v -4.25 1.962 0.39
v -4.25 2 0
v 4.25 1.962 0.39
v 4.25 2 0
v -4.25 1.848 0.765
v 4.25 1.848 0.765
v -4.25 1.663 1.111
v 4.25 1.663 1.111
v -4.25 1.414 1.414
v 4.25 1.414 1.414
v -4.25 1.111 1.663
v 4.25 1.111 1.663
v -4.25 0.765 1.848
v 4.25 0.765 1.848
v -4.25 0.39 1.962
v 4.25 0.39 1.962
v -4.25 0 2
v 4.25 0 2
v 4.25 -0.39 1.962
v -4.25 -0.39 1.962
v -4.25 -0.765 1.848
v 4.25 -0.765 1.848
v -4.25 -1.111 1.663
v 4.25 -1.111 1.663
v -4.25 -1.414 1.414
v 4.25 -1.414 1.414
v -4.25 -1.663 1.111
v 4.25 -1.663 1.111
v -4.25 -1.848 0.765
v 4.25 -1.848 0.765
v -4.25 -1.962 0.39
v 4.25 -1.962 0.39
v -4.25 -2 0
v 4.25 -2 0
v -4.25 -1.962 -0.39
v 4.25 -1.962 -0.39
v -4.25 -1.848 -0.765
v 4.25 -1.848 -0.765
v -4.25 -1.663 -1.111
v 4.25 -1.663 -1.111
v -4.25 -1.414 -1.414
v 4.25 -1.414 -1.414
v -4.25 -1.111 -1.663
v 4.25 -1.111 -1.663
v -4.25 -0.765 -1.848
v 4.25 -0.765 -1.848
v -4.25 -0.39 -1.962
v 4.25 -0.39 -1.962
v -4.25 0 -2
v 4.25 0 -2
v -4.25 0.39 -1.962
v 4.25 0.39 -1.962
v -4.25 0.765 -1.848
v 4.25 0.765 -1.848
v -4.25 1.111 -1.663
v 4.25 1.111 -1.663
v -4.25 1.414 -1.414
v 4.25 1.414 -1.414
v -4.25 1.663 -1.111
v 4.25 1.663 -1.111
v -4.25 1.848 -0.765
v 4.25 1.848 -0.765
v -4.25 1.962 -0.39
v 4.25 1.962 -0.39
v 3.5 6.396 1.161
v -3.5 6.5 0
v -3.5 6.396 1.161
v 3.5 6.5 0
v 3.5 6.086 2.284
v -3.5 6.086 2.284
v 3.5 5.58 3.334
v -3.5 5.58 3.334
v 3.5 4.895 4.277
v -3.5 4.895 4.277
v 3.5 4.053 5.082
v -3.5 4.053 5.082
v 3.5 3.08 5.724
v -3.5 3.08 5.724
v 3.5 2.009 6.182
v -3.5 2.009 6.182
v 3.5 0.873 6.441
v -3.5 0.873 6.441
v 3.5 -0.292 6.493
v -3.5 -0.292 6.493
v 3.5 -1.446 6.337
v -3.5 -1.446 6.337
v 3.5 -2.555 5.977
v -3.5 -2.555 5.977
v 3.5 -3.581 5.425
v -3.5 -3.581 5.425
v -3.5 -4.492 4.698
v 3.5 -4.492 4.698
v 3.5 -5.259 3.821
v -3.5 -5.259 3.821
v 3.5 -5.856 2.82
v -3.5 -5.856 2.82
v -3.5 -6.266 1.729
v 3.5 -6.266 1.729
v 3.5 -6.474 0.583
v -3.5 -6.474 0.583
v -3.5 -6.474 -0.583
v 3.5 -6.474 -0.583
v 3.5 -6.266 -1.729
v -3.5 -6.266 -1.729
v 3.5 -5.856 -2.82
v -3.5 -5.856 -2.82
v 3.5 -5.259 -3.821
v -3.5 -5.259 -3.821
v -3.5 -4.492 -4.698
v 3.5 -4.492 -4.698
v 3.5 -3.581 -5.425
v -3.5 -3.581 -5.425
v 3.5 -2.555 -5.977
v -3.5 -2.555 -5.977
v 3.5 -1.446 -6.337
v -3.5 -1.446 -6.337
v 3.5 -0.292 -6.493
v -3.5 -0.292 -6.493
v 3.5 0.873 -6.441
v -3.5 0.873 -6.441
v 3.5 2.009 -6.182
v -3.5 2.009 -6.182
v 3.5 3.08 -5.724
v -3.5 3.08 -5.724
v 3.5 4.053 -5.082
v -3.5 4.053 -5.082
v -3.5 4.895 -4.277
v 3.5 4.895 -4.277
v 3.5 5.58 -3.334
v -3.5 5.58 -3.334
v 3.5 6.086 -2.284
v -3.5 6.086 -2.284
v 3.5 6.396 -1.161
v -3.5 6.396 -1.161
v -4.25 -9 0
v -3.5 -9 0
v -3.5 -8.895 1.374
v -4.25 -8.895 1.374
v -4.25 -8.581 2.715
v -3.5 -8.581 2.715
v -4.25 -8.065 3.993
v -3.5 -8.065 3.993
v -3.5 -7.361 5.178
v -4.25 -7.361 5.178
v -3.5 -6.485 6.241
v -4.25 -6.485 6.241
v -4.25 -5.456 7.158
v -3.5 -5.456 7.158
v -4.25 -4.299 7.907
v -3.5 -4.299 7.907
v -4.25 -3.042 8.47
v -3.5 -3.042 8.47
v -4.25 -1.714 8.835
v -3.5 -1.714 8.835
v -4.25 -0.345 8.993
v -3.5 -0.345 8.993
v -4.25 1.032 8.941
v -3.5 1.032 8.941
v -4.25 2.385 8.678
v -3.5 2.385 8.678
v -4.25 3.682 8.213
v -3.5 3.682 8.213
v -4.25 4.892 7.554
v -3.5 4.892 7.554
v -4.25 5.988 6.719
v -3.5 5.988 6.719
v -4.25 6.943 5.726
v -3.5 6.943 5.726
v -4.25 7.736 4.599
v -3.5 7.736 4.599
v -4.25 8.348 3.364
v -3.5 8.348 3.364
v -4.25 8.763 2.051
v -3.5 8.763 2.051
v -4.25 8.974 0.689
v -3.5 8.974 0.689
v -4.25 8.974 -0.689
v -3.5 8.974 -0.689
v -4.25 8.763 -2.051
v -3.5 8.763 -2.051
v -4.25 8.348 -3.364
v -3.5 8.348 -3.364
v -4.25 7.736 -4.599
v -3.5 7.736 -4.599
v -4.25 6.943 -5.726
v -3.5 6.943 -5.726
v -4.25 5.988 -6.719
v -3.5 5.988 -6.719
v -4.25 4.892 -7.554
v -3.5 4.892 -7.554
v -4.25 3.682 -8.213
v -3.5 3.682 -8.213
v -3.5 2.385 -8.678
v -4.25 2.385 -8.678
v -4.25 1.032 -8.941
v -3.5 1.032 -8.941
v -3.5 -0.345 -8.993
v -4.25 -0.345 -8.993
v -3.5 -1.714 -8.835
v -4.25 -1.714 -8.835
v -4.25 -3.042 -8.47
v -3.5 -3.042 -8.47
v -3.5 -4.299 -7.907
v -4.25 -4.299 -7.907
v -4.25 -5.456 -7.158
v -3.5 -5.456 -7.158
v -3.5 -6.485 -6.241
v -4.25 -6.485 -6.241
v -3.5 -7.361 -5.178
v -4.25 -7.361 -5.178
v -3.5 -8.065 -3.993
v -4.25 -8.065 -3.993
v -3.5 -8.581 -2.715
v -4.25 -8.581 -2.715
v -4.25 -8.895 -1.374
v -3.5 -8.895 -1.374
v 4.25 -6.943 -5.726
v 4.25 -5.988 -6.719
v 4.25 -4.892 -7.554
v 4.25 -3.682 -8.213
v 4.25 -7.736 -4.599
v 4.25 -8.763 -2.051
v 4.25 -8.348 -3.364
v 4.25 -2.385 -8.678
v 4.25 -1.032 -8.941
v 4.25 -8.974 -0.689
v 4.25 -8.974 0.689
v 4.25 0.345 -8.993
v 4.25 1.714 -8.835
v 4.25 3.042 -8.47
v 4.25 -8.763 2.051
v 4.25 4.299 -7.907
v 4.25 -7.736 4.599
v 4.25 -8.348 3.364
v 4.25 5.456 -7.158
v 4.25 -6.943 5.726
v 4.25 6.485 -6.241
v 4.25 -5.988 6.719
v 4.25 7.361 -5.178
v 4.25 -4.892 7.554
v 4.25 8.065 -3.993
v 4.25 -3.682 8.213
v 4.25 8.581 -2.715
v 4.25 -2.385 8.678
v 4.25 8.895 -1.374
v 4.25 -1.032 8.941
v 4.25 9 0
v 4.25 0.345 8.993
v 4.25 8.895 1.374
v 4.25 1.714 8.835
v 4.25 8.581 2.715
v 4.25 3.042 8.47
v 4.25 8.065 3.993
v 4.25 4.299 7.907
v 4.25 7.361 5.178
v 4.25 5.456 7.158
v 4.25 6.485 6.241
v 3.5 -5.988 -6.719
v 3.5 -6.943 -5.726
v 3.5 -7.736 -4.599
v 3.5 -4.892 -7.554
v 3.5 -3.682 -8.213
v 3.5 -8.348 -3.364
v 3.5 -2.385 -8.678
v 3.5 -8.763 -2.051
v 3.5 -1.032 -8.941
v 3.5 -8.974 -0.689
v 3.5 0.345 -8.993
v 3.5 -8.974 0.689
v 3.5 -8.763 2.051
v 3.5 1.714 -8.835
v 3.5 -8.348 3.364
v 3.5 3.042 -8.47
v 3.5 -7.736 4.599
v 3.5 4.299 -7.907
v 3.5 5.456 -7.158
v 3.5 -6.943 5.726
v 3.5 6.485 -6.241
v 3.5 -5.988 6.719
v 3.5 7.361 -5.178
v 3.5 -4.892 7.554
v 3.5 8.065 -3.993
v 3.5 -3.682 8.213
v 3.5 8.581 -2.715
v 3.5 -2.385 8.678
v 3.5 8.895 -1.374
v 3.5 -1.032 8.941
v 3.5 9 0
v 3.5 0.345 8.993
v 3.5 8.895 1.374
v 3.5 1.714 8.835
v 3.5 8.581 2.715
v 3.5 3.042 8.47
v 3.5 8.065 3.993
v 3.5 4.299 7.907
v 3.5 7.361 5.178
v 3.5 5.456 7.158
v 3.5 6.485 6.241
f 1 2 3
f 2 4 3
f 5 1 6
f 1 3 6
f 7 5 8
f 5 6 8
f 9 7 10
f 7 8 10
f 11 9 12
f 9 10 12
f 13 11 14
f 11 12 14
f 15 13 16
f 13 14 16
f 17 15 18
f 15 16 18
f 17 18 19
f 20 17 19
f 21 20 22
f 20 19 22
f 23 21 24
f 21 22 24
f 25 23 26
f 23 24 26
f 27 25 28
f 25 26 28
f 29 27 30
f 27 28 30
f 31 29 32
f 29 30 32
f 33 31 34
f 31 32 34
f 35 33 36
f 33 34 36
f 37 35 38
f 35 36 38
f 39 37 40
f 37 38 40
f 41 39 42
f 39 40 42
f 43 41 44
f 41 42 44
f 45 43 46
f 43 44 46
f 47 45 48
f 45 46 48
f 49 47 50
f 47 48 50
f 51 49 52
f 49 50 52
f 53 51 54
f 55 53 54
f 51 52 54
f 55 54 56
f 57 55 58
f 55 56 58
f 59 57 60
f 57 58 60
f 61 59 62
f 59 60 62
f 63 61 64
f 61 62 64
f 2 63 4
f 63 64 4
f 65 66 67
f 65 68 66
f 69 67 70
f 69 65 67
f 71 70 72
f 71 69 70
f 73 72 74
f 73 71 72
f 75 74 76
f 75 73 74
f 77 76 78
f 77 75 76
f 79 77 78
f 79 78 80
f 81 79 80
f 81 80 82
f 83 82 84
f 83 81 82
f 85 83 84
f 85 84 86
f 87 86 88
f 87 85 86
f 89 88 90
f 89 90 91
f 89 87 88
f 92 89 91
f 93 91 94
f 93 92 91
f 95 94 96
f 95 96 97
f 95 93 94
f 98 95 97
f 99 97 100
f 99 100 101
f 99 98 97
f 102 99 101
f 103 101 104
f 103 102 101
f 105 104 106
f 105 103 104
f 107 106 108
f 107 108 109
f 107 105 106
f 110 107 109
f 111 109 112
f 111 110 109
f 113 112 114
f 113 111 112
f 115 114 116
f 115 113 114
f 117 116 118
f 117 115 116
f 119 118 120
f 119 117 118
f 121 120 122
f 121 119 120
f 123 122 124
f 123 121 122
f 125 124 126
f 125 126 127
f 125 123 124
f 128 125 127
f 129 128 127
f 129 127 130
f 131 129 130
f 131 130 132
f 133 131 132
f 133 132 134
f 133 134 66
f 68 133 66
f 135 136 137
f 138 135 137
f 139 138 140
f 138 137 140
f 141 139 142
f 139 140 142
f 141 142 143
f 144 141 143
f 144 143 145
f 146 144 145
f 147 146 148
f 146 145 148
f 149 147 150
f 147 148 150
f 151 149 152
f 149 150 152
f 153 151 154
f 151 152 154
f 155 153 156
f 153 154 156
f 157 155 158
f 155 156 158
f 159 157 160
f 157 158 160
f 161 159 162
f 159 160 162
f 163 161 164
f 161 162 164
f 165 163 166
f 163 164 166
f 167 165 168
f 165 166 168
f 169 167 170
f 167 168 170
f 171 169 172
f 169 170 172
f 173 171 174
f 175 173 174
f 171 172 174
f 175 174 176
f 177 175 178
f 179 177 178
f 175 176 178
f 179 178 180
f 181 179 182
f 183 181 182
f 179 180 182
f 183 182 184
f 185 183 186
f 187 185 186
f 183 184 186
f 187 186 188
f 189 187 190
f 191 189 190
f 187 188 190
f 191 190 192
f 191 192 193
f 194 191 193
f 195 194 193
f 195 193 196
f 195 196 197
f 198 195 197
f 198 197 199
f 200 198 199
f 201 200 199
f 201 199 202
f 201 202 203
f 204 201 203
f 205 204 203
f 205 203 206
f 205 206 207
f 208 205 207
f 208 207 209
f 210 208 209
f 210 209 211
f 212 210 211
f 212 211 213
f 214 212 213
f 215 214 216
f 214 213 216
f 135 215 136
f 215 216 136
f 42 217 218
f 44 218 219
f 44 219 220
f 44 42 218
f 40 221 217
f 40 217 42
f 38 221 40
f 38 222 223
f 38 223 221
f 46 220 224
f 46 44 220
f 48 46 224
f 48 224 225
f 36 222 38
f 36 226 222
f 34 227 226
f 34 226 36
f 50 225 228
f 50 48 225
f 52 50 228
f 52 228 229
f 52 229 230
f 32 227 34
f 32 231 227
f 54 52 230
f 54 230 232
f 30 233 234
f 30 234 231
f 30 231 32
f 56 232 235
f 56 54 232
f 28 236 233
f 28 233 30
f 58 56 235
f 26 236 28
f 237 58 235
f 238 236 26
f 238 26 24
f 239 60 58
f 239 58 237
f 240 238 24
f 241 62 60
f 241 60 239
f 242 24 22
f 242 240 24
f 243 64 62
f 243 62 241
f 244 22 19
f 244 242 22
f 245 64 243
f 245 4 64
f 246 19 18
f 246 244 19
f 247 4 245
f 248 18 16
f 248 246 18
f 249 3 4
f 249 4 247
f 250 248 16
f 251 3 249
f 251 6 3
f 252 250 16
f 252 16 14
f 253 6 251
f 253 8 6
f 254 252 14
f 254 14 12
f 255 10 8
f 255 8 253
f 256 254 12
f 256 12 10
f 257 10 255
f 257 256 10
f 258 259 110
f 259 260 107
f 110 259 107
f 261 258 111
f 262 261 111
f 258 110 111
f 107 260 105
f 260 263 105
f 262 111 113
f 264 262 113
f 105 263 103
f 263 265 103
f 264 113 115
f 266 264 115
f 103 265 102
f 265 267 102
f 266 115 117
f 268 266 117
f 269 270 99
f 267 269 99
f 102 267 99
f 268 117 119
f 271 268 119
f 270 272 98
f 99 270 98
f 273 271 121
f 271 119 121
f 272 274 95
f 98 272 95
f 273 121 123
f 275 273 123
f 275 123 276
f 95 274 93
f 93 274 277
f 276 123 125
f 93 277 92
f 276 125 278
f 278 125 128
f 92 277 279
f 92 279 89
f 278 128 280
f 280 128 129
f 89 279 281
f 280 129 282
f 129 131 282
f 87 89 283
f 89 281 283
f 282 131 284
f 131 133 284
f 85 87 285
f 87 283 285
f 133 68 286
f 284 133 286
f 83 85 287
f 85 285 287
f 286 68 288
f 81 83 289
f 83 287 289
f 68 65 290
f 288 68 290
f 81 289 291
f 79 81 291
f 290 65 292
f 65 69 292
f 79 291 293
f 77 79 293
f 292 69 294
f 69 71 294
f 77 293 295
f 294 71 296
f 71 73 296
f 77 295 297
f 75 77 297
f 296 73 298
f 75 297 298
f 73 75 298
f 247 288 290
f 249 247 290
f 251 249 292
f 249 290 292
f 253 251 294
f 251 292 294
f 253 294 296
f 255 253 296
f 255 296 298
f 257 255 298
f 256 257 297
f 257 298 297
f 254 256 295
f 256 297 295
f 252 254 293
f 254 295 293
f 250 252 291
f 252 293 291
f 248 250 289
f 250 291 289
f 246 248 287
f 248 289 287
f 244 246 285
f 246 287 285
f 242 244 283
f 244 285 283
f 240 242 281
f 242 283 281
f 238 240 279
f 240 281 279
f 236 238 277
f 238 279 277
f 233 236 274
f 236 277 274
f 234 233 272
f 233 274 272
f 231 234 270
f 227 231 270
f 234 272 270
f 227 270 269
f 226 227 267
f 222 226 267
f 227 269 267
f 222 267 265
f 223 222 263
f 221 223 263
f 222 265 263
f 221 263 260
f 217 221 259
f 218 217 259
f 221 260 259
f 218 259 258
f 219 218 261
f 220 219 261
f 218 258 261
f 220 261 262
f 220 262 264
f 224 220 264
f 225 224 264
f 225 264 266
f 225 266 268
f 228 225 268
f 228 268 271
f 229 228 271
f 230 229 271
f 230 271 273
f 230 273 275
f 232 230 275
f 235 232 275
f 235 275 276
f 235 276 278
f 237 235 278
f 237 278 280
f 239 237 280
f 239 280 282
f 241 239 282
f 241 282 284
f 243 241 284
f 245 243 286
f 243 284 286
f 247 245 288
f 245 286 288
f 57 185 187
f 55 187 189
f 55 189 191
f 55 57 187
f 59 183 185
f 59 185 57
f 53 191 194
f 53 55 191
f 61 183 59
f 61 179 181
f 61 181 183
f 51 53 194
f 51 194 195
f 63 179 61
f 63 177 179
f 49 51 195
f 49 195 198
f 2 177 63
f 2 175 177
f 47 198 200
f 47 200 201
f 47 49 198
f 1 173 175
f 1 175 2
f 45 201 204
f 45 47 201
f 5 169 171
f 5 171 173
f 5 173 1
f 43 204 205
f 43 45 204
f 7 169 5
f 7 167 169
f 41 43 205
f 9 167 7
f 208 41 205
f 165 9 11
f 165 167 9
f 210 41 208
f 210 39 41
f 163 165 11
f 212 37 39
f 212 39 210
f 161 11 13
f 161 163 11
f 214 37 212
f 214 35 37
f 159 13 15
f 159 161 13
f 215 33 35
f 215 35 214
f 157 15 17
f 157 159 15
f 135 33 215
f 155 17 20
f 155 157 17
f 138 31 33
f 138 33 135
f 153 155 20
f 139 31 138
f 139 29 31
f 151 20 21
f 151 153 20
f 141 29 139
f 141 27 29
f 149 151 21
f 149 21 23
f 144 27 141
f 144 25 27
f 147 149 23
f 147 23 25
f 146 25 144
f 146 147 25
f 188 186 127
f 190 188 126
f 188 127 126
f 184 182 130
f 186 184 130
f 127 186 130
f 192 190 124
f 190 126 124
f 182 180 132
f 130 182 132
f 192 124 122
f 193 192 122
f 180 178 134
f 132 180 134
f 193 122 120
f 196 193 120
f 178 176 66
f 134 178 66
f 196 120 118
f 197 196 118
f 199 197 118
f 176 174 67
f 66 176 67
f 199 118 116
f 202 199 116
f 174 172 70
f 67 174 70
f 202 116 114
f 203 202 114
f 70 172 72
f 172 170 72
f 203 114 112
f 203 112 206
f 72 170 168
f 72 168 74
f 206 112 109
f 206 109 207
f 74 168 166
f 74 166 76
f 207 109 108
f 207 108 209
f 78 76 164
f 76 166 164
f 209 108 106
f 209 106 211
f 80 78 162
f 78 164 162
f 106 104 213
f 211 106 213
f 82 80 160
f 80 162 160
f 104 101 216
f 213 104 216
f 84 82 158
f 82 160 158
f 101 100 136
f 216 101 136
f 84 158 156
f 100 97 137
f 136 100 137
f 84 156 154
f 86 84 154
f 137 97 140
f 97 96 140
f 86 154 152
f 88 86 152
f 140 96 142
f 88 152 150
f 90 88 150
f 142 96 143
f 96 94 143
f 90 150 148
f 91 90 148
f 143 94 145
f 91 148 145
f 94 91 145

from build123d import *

# Parameters (mm, degrees)
F0_R          = 6.5
F1_DEPTH      = 3.5
F1_DEPTH_BACK = 3.5
F2_R          = 9
F3_DEPTH      = 0.75
F4_R          = 9
F5_DEPTH      = 0.75
F6_R          = 2
F7_DEPTH      = 25
F7_DEPTH_BACK = 25


with BuildPart() as f1:
    # F0 (on Right) → F1 (new body, two sides)
    with BuildSketch(Plane.YZ) as f1_sk:
        Circle(F0_R)
    extrude(amount=F1_DEPTH)
    extrude(f1_sk.sketch, amount=-F1_DEPTH_BACK)

    # F2 (on face) → F3 (join)
    with BuildSketch(Plane.YZ.offset(3.5)):
        Circle(F2_R)
    extrude(amount=F3_DEPTH)

    # F4 (on face) → F5 (join)
    with BuildSketch(Plane(origin=(-3.5, 0, 0), x_dir=(0, -1, 0), z_dir=(-1, 0, 0))):
        Circle(F4_R)
    extrude(amount=F5_DEPTH)

    # F6 (on Right) → F7 (cut, two sides)
    with BuildSketch(Plane.YZ) as f7_sk:
        Circle(F6_R)
    extrude(amount=-F7_DEPTH, mode=Mode.SUBTRACT)
    extrude(f7_sk.sketch, amount=F7_DEPTH_BACK, mode=Mode.SUBTRACT)


solid = f1.part
